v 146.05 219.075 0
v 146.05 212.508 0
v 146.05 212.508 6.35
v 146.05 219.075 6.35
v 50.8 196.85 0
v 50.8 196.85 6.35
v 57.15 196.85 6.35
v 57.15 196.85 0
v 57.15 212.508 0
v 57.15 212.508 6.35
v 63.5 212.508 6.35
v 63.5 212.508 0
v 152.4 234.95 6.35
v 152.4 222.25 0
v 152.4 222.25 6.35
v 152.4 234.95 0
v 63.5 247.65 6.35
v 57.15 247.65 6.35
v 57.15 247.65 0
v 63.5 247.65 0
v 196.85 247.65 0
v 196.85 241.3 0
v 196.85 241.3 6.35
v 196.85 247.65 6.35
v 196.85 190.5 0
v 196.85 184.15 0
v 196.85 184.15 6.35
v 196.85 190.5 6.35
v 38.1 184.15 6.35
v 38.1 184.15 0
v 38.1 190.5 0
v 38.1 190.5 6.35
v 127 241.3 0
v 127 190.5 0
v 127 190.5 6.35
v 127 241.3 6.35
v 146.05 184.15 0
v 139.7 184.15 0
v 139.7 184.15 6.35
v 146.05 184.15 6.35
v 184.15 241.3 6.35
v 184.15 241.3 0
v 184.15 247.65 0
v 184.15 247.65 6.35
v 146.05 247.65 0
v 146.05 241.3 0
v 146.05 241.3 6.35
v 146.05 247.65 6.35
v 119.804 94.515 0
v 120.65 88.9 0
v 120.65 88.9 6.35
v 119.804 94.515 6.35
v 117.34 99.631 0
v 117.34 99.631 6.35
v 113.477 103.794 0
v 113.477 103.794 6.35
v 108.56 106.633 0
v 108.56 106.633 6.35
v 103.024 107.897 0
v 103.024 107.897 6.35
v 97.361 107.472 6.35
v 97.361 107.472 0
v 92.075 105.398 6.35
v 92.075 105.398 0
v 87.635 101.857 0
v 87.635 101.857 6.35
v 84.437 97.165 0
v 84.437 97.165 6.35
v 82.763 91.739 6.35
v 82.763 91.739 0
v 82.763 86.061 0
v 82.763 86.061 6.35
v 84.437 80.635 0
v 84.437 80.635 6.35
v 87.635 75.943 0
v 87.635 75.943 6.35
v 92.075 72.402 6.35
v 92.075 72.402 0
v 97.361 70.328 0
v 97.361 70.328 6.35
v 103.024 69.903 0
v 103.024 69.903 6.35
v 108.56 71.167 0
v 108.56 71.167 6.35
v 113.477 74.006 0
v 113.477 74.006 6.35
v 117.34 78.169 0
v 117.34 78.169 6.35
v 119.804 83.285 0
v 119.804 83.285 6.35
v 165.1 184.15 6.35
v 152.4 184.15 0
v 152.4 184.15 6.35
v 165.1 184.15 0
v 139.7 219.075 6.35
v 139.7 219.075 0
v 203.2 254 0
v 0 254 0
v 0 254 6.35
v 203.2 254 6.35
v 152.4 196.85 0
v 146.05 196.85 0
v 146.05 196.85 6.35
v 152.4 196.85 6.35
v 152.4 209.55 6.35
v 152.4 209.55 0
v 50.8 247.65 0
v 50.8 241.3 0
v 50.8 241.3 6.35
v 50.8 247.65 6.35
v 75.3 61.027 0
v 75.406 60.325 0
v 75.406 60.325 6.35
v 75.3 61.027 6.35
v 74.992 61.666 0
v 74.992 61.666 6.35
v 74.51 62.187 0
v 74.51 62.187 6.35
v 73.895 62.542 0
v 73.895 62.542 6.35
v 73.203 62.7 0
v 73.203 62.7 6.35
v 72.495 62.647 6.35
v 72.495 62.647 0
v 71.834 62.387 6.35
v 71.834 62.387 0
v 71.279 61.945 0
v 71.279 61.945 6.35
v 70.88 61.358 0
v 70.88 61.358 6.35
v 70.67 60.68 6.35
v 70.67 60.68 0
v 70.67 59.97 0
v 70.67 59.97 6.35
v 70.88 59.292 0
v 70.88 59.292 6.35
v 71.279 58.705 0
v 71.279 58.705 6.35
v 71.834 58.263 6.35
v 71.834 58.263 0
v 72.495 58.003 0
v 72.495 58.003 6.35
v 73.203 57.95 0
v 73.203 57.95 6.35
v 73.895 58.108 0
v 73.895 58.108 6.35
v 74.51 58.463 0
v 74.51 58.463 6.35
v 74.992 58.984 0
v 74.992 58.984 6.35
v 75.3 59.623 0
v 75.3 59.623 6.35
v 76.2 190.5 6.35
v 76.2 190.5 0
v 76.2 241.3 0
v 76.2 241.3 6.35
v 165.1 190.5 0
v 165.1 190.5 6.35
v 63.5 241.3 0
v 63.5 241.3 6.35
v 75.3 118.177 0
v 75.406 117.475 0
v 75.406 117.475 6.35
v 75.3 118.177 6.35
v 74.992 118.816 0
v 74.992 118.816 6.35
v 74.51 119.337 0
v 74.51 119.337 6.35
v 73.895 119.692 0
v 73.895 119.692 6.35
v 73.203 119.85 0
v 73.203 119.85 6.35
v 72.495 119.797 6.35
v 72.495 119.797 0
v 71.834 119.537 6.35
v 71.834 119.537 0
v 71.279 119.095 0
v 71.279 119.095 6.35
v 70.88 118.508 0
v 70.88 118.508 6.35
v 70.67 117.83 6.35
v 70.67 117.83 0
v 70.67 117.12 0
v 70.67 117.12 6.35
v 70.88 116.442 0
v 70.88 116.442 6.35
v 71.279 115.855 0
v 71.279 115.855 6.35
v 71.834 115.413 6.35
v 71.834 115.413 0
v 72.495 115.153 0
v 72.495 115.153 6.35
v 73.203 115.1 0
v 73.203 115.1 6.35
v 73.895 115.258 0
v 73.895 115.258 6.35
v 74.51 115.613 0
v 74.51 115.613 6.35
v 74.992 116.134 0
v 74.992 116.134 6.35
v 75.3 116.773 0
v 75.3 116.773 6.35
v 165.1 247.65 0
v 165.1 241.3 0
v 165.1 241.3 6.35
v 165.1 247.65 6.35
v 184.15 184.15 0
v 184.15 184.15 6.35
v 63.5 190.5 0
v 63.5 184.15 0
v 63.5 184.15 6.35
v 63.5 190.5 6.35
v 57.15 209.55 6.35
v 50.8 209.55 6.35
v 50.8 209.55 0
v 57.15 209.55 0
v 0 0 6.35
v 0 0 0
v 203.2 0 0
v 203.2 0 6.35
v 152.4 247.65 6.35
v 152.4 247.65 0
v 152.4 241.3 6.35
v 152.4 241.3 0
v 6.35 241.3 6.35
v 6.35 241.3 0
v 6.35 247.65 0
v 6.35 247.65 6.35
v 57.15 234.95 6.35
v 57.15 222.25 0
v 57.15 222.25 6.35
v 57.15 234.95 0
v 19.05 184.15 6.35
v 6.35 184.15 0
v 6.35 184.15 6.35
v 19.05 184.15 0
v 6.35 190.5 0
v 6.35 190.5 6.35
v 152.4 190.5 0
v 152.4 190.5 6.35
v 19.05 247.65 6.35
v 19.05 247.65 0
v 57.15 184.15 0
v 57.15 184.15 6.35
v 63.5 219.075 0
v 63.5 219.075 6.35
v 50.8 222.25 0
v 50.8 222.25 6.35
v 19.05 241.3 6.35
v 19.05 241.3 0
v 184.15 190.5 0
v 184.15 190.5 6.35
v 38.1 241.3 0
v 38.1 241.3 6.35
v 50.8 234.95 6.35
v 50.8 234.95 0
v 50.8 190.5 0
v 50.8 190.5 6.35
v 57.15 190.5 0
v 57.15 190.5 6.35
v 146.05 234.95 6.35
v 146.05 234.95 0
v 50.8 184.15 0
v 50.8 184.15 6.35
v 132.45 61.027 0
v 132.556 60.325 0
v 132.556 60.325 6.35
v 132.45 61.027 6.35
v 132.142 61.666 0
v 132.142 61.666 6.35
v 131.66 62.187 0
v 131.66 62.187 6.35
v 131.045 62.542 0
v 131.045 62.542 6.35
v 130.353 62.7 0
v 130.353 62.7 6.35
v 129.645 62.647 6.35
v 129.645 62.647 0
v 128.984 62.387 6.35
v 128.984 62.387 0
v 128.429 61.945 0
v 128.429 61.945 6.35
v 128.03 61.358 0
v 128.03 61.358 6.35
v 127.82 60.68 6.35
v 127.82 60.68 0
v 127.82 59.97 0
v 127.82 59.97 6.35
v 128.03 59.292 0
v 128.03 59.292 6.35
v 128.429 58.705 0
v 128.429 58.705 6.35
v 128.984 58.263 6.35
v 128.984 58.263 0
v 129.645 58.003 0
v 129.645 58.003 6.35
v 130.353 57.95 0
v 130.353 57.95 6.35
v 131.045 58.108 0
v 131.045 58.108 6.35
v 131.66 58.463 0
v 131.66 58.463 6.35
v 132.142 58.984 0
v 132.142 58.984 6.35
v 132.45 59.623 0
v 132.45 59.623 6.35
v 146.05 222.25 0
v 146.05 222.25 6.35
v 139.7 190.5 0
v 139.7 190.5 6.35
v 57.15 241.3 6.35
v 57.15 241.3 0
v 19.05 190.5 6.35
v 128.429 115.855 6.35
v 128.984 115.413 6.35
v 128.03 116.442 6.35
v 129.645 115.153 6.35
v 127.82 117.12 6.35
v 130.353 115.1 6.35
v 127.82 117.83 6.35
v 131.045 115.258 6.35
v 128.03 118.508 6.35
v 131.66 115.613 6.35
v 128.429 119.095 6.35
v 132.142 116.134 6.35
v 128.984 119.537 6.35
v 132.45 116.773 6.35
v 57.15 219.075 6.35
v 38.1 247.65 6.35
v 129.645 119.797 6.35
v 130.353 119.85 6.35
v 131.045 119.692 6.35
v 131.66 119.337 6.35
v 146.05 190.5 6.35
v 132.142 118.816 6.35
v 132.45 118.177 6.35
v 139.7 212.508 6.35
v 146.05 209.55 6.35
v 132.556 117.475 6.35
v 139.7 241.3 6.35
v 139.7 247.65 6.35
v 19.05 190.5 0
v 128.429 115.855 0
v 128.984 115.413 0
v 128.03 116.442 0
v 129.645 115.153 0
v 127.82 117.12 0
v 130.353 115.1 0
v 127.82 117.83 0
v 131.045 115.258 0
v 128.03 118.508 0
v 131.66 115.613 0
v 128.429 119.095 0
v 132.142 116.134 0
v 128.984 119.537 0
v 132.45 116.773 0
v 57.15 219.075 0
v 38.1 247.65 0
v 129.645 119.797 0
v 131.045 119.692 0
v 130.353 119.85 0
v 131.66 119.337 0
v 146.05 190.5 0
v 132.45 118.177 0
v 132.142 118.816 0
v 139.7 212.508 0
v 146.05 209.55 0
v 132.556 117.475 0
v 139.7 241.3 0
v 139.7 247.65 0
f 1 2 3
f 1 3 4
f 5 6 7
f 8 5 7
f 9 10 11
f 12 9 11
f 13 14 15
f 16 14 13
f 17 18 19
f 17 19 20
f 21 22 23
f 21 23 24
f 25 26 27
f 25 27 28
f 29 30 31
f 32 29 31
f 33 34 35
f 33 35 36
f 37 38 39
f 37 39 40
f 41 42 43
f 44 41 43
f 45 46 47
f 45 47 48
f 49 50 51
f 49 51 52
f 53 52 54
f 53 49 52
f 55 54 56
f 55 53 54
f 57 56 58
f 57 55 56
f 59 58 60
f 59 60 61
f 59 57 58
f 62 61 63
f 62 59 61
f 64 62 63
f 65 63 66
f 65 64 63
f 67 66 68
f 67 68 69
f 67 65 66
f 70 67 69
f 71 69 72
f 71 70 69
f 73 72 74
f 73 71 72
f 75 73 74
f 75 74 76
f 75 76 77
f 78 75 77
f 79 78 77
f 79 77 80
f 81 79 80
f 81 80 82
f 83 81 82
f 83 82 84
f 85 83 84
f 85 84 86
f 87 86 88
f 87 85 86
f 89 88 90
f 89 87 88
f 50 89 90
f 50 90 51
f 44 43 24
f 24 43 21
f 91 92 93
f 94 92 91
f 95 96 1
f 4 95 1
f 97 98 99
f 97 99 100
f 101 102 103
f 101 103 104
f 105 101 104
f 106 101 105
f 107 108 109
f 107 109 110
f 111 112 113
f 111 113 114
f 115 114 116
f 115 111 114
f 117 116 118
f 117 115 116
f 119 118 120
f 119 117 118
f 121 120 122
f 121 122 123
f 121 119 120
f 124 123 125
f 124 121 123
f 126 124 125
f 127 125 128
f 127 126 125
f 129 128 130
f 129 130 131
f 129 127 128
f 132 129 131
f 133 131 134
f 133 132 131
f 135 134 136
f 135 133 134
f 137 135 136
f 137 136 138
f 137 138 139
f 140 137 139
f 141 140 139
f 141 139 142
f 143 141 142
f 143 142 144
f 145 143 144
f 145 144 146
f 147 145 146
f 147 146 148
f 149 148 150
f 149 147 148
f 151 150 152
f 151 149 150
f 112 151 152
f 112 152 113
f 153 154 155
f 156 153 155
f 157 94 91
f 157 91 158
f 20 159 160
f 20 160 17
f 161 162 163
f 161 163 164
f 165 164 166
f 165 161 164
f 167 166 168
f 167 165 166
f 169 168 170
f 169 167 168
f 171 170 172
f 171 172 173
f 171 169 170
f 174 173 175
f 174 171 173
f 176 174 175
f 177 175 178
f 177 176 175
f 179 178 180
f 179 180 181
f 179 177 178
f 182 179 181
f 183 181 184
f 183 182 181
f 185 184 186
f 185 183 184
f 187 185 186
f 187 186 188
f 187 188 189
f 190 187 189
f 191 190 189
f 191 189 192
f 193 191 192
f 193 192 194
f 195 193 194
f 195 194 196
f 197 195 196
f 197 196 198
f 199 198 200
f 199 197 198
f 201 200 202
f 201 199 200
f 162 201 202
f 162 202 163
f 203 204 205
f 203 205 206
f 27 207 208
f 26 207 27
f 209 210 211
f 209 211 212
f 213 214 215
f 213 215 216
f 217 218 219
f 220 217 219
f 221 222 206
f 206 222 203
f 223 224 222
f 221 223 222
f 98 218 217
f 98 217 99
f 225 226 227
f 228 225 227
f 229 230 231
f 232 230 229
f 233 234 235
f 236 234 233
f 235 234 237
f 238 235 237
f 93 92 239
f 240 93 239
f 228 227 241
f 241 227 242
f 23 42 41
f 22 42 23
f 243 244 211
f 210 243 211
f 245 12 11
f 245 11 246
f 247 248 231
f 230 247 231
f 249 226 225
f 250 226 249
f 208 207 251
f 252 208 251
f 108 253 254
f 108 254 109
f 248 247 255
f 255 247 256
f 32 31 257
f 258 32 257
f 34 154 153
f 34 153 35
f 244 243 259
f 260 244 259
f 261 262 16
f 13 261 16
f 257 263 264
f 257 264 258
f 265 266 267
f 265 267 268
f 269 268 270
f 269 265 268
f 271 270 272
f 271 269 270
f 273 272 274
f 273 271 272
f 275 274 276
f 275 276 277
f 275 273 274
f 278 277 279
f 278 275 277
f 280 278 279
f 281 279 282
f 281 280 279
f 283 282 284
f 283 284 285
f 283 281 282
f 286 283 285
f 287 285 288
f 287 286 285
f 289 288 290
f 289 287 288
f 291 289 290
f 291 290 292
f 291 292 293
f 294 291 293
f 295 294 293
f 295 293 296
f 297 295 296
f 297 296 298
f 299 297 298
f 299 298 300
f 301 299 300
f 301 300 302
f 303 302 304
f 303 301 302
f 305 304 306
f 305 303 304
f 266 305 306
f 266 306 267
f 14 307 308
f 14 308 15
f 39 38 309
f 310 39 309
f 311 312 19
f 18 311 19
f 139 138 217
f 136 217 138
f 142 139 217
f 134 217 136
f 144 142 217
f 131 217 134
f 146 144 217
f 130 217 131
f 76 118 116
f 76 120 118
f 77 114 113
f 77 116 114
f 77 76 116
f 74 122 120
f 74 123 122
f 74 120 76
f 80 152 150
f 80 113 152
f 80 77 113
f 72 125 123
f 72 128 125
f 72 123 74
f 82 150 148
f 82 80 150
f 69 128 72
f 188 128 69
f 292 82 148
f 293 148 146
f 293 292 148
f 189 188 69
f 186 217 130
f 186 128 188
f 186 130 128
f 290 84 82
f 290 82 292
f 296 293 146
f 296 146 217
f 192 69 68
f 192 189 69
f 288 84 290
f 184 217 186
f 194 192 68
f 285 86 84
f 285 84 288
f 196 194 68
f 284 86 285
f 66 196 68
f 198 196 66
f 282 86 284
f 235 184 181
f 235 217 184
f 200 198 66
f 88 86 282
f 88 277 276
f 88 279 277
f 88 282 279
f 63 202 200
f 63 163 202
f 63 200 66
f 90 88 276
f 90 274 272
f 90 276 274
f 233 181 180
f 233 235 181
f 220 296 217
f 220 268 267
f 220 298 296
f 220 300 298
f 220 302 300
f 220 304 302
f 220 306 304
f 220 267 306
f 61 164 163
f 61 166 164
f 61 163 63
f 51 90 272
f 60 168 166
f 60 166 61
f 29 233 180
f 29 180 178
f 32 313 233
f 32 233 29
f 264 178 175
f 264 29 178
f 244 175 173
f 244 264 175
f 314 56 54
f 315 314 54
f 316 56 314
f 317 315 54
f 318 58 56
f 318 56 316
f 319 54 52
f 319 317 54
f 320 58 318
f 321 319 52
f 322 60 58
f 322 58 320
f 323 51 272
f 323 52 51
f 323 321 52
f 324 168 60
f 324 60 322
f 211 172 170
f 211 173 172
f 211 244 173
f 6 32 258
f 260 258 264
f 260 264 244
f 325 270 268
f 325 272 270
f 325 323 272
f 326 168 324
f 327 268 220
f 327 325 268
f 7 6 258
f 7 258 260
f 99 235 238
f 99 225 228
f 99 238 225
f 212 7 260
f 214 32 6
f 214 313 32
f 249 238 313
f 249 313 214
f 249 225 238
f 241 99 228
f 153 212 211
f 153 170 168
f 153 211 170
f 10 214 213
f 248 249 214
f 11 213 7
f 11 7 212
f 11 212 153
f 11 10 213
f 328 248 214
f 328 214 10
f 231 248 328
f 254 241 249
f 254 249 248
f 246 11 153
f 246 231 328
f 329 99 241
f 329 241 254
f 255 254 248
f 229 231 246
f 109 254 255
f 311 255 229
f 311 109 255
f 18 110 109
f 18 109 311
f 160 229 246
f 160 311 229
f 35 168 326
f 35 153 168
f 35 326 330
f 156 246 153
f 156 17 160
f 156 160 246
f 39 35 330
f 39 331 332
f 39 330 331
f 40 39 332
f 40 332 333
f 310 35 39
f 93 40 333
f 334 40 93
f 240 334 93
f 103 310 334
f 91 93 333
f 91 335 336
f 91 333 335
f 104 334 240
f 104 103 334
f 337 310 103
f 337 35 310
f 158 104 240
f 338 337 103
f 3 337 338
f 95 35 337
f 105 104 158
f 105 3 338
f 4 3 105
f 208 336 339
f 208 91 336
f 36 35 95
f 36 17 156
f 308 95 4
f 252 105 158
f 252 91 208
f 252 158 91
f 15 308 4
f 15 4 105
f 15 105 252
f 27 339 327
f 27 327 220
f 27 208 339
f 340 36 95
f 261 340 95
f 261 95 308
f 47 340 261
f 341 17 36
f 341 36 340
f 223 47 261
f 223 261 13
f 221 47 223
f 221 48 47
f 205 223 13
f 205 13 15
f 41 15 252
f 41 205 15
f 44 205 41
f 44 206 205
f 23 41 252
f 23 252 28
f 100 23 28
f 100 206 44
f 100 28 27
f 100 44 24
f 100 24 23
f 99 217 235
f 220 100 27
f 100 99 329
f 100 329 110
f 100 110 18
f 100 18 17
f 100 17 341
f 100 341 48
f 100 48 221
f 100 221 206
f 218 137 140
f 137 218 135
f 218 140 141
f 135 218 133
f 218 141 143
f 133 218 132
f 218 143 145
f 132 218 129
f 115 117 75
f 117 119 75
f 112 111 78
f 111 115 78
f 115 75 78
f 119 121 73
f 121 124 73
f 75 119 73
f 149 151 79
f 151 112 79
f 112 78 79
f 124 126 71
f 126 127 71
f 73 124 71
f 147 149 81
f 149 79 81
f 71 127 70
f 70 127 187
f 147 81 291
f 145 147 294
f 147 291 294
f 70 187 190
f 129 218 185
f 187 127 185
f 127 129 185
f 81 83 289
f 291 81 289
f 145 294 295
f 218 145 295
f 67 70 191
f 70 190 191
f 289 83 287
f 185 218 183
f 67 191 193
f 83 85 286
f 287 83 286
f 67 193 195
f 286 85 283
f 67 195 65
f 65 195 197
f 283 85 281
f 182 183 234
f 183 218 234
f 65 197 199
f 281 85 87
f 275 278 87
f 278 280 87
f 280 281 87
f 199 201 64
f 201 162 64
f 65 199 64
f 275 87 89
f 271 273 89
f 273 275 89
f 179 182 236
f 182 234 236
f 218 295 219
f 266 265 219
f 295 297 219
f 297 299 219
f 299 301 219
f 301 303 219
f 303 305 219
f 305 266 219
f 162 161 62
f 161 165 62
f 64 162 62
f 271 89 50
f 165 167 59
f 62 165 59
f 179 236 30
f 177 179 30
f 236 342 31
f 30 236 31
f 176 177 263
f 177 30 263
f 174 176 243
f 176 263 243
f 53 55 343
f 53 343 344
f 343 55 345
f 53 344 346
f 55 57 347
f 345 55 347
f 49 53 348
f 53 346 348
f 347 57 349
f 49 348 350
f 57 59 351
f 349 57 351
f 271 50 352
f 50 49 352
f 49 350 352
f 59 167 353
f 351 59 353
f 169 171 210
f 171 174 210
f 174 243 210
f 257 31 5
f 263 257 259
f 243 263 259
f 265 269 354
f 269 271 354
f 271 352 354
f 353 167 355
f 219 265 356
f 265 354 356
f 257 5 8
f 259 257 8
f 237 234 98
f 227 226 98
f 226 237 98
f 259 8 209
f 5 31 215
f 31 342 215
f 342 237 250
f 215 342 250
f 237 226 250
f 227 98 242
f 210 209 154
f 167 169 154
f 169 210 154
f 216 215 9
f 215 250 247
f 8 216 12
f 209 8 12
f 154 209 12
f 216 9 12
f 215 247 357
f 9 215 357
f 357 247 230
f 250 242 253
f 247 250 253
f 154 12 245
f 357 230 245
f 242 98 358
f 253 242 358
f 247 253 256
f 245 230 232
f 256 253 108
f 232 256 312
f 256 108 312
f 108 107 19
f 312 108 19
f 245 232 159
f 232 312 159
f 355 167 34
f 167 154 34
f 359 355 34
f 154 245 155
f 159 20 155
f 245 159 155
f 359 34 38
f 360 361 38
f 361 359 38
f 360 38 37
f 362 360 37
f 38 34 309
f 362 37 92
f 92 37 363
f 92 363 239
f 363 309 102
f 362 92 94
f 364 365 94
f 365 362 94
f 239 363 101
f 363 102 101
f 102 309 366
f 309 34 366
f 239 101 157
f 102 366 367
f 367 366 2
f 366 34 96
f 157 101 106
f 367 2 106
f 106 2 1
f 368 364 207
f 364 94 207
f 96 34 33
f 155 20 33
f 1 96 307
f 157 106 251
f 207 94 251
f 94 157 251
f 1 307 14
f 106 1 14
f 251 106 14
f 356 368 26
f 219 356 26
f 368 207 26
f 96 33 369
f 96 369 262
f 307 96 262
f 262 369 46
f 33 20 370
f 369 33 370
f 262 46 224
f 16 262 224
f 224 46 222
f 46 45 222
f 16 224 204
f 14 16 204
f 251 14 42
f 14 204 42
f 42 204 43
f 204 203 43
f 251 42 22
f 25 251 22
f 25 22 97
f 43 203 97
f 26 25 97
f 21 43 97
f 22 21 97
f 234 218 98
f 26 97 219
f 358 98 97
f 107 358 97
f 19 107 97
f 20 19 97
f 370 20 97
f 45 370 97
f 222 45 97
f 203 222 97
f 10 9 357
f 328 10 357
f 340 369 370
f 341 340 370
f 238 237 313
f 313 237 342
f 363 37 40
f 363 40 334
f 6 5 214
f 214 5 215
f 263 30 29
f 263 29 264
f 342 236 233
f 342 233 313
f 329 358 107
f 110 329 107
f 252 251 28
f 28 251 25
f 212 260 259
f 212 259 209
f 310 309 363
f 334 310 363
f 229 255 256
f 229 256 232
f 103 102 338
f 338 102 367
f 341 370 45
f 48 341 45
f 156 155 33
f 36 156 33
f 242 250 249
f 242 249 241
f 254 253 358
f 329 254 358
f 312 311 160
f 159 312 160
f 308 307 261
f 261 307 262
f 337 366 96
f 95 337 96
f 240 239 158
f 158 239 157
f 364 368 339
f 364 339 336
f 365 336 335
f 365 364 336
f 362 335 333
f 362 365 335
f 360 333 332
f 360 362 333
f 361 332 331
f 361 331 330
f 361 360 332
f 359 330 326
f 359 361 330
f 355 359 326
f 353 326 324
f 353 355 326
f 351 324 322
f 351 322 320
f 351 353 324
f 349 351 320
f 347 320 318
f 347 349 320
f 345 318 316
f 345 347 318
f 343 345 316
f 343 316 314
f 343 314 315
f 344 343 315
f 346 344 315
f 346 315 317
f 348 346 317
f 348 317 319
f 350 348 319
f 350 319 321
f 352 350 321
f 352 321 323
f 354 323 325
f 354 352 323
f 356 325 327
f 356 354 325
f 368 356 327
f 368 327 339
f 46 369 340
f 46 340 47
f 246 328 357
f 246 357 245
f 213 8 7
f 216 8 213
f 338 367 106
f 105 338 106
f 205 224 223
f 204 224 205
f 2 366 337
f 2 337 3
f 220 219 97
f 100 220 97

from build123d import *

# Parameters (mm, degrees)
F0_W     = 203.2
F0_H     = 254
F0_R     = 2.38125
F0_R_2   = 19.05
F0_W_2   = 12.7
F0_H_2   = 6.35
F0_W_3   = 6.35
F0_H_3   = 12.7
F0_H_4   = 6.567365
F0_W_4   = 50.8
F0_H_5   = 50.8
F1_DEPTH = 6.35


with BuildPart() as f1:
    # F0 (on Top) → F1 (new body)
    with BuildSketch(Plane.XY):
        with Locations((101.6, 127)):
            Rectangle(F0_W, F0_H)
        with Locations((73.025, 60.325)):
            Circle(F0_R, mode=Mode.SUBTRACT)
        with Locations((101.6, 88.9)):
            Circle(F0_R_2, mode=Mode.SUBTRACT)
        with Locations((73.025, 117.475)):
            Circle(F0_R, mode=Mode.SUBTRACT)
        with Locations((130.175, 60.325)):
            Circle(F0_R, mode=Mode.SUBTRACT)
        with Locations((130.175, 117.475)):
            Circle(F0_R, mode=Mode.SUBTRACT)
        with Locations((12.7, 187.325)):
            Rectangle(F0_W_2, F0_H_2, mode=Mode.SUBTRACT)
        with Locations((44.45, 187.325)):
            Rectangle(F0_W_2, F0_H_2, mode=Mode.SUBTRACT)
        with Locations((60.325, 187.325)):
            Rectangle(F0_W_3, F0_H_2, mode=Mode.SUBTRACT)
        with Locations((12.7, 244.475)):
            Rectangle(F0_W_2, F0_H_2, mode=Mode.SUBTRACT)
        with Locations((44.45, 244.475)):
            Rectangle(F0_W_2, F0_H_2, mode=Mode.SUBTRACT)
        with Locations((53.975, 203.2)):
            Rectangle(F0_W_3, F0_H_3, mode=Mode.SUBTRACT)
        with Locations((60.325, 215.791317)):
            Rectangle(F0_W_3, F0_H_4, mode=Mode.SUBTRACT)
        with Locations((101.6, 215.9)):
            Rectangle(F0_W_4, F0_H_5, mode=Mode.SUBTRACT)
        with Locations((53.975, 228.6)):
            Rectangle(F0_W_3, F0_H_3, mode=Mode.SUBTRACT)
        with Locations((60.325, 244.475)):
            Rectangle(F0_W_3, F0_H_2, mode=Mode.SUBTRACT)
        with Locations((142.875, 187.325)):
            Rectangle(F0_W_3, F0_H_2, mode=Mode.SUBTRACT)
        with Locations((158.75, 187.325)):
            Rectangle(F0_W_2, F0_H_2, mode=Mode.SUBTRACT)
        with Locations((190.5, 187.325)):
            Rectangle(F0_W_2, F0_H_2, mode=Mode.SUBTRACT)
        with Locations((149.225, 203.2)):
            Rectangle(F0_W_3, F0_H_3, mode=Mode.SUBTRACT)
        with Locations((142.875, 215.791317)):
            Rectangle(F0_W_3, F0_H_4, mode=Mode.SUBTRACT)
        with Locations((149.225, 228.6)):
            Rectangle(F0_W_3, F0_H_3, mode=Mode.SUBTRACT)
        with Locations((142.875, 244.475)):
            Rectangle(F0_W_3, F0_H_2, mode=Mode.SUBTRACT)
        with Locations((158.75, 244.475)):
            Rectangle(F0_W_2, F0_H_2, mode=Mode.SUBTRACT)
        with Locations((190.5, 244.475)):
            Rectangle(F0_W_2, F0_H_2, mode=Mode.SUBTRACT)
    extrude(amount=F1_DEPTH)


solid = f1.part
